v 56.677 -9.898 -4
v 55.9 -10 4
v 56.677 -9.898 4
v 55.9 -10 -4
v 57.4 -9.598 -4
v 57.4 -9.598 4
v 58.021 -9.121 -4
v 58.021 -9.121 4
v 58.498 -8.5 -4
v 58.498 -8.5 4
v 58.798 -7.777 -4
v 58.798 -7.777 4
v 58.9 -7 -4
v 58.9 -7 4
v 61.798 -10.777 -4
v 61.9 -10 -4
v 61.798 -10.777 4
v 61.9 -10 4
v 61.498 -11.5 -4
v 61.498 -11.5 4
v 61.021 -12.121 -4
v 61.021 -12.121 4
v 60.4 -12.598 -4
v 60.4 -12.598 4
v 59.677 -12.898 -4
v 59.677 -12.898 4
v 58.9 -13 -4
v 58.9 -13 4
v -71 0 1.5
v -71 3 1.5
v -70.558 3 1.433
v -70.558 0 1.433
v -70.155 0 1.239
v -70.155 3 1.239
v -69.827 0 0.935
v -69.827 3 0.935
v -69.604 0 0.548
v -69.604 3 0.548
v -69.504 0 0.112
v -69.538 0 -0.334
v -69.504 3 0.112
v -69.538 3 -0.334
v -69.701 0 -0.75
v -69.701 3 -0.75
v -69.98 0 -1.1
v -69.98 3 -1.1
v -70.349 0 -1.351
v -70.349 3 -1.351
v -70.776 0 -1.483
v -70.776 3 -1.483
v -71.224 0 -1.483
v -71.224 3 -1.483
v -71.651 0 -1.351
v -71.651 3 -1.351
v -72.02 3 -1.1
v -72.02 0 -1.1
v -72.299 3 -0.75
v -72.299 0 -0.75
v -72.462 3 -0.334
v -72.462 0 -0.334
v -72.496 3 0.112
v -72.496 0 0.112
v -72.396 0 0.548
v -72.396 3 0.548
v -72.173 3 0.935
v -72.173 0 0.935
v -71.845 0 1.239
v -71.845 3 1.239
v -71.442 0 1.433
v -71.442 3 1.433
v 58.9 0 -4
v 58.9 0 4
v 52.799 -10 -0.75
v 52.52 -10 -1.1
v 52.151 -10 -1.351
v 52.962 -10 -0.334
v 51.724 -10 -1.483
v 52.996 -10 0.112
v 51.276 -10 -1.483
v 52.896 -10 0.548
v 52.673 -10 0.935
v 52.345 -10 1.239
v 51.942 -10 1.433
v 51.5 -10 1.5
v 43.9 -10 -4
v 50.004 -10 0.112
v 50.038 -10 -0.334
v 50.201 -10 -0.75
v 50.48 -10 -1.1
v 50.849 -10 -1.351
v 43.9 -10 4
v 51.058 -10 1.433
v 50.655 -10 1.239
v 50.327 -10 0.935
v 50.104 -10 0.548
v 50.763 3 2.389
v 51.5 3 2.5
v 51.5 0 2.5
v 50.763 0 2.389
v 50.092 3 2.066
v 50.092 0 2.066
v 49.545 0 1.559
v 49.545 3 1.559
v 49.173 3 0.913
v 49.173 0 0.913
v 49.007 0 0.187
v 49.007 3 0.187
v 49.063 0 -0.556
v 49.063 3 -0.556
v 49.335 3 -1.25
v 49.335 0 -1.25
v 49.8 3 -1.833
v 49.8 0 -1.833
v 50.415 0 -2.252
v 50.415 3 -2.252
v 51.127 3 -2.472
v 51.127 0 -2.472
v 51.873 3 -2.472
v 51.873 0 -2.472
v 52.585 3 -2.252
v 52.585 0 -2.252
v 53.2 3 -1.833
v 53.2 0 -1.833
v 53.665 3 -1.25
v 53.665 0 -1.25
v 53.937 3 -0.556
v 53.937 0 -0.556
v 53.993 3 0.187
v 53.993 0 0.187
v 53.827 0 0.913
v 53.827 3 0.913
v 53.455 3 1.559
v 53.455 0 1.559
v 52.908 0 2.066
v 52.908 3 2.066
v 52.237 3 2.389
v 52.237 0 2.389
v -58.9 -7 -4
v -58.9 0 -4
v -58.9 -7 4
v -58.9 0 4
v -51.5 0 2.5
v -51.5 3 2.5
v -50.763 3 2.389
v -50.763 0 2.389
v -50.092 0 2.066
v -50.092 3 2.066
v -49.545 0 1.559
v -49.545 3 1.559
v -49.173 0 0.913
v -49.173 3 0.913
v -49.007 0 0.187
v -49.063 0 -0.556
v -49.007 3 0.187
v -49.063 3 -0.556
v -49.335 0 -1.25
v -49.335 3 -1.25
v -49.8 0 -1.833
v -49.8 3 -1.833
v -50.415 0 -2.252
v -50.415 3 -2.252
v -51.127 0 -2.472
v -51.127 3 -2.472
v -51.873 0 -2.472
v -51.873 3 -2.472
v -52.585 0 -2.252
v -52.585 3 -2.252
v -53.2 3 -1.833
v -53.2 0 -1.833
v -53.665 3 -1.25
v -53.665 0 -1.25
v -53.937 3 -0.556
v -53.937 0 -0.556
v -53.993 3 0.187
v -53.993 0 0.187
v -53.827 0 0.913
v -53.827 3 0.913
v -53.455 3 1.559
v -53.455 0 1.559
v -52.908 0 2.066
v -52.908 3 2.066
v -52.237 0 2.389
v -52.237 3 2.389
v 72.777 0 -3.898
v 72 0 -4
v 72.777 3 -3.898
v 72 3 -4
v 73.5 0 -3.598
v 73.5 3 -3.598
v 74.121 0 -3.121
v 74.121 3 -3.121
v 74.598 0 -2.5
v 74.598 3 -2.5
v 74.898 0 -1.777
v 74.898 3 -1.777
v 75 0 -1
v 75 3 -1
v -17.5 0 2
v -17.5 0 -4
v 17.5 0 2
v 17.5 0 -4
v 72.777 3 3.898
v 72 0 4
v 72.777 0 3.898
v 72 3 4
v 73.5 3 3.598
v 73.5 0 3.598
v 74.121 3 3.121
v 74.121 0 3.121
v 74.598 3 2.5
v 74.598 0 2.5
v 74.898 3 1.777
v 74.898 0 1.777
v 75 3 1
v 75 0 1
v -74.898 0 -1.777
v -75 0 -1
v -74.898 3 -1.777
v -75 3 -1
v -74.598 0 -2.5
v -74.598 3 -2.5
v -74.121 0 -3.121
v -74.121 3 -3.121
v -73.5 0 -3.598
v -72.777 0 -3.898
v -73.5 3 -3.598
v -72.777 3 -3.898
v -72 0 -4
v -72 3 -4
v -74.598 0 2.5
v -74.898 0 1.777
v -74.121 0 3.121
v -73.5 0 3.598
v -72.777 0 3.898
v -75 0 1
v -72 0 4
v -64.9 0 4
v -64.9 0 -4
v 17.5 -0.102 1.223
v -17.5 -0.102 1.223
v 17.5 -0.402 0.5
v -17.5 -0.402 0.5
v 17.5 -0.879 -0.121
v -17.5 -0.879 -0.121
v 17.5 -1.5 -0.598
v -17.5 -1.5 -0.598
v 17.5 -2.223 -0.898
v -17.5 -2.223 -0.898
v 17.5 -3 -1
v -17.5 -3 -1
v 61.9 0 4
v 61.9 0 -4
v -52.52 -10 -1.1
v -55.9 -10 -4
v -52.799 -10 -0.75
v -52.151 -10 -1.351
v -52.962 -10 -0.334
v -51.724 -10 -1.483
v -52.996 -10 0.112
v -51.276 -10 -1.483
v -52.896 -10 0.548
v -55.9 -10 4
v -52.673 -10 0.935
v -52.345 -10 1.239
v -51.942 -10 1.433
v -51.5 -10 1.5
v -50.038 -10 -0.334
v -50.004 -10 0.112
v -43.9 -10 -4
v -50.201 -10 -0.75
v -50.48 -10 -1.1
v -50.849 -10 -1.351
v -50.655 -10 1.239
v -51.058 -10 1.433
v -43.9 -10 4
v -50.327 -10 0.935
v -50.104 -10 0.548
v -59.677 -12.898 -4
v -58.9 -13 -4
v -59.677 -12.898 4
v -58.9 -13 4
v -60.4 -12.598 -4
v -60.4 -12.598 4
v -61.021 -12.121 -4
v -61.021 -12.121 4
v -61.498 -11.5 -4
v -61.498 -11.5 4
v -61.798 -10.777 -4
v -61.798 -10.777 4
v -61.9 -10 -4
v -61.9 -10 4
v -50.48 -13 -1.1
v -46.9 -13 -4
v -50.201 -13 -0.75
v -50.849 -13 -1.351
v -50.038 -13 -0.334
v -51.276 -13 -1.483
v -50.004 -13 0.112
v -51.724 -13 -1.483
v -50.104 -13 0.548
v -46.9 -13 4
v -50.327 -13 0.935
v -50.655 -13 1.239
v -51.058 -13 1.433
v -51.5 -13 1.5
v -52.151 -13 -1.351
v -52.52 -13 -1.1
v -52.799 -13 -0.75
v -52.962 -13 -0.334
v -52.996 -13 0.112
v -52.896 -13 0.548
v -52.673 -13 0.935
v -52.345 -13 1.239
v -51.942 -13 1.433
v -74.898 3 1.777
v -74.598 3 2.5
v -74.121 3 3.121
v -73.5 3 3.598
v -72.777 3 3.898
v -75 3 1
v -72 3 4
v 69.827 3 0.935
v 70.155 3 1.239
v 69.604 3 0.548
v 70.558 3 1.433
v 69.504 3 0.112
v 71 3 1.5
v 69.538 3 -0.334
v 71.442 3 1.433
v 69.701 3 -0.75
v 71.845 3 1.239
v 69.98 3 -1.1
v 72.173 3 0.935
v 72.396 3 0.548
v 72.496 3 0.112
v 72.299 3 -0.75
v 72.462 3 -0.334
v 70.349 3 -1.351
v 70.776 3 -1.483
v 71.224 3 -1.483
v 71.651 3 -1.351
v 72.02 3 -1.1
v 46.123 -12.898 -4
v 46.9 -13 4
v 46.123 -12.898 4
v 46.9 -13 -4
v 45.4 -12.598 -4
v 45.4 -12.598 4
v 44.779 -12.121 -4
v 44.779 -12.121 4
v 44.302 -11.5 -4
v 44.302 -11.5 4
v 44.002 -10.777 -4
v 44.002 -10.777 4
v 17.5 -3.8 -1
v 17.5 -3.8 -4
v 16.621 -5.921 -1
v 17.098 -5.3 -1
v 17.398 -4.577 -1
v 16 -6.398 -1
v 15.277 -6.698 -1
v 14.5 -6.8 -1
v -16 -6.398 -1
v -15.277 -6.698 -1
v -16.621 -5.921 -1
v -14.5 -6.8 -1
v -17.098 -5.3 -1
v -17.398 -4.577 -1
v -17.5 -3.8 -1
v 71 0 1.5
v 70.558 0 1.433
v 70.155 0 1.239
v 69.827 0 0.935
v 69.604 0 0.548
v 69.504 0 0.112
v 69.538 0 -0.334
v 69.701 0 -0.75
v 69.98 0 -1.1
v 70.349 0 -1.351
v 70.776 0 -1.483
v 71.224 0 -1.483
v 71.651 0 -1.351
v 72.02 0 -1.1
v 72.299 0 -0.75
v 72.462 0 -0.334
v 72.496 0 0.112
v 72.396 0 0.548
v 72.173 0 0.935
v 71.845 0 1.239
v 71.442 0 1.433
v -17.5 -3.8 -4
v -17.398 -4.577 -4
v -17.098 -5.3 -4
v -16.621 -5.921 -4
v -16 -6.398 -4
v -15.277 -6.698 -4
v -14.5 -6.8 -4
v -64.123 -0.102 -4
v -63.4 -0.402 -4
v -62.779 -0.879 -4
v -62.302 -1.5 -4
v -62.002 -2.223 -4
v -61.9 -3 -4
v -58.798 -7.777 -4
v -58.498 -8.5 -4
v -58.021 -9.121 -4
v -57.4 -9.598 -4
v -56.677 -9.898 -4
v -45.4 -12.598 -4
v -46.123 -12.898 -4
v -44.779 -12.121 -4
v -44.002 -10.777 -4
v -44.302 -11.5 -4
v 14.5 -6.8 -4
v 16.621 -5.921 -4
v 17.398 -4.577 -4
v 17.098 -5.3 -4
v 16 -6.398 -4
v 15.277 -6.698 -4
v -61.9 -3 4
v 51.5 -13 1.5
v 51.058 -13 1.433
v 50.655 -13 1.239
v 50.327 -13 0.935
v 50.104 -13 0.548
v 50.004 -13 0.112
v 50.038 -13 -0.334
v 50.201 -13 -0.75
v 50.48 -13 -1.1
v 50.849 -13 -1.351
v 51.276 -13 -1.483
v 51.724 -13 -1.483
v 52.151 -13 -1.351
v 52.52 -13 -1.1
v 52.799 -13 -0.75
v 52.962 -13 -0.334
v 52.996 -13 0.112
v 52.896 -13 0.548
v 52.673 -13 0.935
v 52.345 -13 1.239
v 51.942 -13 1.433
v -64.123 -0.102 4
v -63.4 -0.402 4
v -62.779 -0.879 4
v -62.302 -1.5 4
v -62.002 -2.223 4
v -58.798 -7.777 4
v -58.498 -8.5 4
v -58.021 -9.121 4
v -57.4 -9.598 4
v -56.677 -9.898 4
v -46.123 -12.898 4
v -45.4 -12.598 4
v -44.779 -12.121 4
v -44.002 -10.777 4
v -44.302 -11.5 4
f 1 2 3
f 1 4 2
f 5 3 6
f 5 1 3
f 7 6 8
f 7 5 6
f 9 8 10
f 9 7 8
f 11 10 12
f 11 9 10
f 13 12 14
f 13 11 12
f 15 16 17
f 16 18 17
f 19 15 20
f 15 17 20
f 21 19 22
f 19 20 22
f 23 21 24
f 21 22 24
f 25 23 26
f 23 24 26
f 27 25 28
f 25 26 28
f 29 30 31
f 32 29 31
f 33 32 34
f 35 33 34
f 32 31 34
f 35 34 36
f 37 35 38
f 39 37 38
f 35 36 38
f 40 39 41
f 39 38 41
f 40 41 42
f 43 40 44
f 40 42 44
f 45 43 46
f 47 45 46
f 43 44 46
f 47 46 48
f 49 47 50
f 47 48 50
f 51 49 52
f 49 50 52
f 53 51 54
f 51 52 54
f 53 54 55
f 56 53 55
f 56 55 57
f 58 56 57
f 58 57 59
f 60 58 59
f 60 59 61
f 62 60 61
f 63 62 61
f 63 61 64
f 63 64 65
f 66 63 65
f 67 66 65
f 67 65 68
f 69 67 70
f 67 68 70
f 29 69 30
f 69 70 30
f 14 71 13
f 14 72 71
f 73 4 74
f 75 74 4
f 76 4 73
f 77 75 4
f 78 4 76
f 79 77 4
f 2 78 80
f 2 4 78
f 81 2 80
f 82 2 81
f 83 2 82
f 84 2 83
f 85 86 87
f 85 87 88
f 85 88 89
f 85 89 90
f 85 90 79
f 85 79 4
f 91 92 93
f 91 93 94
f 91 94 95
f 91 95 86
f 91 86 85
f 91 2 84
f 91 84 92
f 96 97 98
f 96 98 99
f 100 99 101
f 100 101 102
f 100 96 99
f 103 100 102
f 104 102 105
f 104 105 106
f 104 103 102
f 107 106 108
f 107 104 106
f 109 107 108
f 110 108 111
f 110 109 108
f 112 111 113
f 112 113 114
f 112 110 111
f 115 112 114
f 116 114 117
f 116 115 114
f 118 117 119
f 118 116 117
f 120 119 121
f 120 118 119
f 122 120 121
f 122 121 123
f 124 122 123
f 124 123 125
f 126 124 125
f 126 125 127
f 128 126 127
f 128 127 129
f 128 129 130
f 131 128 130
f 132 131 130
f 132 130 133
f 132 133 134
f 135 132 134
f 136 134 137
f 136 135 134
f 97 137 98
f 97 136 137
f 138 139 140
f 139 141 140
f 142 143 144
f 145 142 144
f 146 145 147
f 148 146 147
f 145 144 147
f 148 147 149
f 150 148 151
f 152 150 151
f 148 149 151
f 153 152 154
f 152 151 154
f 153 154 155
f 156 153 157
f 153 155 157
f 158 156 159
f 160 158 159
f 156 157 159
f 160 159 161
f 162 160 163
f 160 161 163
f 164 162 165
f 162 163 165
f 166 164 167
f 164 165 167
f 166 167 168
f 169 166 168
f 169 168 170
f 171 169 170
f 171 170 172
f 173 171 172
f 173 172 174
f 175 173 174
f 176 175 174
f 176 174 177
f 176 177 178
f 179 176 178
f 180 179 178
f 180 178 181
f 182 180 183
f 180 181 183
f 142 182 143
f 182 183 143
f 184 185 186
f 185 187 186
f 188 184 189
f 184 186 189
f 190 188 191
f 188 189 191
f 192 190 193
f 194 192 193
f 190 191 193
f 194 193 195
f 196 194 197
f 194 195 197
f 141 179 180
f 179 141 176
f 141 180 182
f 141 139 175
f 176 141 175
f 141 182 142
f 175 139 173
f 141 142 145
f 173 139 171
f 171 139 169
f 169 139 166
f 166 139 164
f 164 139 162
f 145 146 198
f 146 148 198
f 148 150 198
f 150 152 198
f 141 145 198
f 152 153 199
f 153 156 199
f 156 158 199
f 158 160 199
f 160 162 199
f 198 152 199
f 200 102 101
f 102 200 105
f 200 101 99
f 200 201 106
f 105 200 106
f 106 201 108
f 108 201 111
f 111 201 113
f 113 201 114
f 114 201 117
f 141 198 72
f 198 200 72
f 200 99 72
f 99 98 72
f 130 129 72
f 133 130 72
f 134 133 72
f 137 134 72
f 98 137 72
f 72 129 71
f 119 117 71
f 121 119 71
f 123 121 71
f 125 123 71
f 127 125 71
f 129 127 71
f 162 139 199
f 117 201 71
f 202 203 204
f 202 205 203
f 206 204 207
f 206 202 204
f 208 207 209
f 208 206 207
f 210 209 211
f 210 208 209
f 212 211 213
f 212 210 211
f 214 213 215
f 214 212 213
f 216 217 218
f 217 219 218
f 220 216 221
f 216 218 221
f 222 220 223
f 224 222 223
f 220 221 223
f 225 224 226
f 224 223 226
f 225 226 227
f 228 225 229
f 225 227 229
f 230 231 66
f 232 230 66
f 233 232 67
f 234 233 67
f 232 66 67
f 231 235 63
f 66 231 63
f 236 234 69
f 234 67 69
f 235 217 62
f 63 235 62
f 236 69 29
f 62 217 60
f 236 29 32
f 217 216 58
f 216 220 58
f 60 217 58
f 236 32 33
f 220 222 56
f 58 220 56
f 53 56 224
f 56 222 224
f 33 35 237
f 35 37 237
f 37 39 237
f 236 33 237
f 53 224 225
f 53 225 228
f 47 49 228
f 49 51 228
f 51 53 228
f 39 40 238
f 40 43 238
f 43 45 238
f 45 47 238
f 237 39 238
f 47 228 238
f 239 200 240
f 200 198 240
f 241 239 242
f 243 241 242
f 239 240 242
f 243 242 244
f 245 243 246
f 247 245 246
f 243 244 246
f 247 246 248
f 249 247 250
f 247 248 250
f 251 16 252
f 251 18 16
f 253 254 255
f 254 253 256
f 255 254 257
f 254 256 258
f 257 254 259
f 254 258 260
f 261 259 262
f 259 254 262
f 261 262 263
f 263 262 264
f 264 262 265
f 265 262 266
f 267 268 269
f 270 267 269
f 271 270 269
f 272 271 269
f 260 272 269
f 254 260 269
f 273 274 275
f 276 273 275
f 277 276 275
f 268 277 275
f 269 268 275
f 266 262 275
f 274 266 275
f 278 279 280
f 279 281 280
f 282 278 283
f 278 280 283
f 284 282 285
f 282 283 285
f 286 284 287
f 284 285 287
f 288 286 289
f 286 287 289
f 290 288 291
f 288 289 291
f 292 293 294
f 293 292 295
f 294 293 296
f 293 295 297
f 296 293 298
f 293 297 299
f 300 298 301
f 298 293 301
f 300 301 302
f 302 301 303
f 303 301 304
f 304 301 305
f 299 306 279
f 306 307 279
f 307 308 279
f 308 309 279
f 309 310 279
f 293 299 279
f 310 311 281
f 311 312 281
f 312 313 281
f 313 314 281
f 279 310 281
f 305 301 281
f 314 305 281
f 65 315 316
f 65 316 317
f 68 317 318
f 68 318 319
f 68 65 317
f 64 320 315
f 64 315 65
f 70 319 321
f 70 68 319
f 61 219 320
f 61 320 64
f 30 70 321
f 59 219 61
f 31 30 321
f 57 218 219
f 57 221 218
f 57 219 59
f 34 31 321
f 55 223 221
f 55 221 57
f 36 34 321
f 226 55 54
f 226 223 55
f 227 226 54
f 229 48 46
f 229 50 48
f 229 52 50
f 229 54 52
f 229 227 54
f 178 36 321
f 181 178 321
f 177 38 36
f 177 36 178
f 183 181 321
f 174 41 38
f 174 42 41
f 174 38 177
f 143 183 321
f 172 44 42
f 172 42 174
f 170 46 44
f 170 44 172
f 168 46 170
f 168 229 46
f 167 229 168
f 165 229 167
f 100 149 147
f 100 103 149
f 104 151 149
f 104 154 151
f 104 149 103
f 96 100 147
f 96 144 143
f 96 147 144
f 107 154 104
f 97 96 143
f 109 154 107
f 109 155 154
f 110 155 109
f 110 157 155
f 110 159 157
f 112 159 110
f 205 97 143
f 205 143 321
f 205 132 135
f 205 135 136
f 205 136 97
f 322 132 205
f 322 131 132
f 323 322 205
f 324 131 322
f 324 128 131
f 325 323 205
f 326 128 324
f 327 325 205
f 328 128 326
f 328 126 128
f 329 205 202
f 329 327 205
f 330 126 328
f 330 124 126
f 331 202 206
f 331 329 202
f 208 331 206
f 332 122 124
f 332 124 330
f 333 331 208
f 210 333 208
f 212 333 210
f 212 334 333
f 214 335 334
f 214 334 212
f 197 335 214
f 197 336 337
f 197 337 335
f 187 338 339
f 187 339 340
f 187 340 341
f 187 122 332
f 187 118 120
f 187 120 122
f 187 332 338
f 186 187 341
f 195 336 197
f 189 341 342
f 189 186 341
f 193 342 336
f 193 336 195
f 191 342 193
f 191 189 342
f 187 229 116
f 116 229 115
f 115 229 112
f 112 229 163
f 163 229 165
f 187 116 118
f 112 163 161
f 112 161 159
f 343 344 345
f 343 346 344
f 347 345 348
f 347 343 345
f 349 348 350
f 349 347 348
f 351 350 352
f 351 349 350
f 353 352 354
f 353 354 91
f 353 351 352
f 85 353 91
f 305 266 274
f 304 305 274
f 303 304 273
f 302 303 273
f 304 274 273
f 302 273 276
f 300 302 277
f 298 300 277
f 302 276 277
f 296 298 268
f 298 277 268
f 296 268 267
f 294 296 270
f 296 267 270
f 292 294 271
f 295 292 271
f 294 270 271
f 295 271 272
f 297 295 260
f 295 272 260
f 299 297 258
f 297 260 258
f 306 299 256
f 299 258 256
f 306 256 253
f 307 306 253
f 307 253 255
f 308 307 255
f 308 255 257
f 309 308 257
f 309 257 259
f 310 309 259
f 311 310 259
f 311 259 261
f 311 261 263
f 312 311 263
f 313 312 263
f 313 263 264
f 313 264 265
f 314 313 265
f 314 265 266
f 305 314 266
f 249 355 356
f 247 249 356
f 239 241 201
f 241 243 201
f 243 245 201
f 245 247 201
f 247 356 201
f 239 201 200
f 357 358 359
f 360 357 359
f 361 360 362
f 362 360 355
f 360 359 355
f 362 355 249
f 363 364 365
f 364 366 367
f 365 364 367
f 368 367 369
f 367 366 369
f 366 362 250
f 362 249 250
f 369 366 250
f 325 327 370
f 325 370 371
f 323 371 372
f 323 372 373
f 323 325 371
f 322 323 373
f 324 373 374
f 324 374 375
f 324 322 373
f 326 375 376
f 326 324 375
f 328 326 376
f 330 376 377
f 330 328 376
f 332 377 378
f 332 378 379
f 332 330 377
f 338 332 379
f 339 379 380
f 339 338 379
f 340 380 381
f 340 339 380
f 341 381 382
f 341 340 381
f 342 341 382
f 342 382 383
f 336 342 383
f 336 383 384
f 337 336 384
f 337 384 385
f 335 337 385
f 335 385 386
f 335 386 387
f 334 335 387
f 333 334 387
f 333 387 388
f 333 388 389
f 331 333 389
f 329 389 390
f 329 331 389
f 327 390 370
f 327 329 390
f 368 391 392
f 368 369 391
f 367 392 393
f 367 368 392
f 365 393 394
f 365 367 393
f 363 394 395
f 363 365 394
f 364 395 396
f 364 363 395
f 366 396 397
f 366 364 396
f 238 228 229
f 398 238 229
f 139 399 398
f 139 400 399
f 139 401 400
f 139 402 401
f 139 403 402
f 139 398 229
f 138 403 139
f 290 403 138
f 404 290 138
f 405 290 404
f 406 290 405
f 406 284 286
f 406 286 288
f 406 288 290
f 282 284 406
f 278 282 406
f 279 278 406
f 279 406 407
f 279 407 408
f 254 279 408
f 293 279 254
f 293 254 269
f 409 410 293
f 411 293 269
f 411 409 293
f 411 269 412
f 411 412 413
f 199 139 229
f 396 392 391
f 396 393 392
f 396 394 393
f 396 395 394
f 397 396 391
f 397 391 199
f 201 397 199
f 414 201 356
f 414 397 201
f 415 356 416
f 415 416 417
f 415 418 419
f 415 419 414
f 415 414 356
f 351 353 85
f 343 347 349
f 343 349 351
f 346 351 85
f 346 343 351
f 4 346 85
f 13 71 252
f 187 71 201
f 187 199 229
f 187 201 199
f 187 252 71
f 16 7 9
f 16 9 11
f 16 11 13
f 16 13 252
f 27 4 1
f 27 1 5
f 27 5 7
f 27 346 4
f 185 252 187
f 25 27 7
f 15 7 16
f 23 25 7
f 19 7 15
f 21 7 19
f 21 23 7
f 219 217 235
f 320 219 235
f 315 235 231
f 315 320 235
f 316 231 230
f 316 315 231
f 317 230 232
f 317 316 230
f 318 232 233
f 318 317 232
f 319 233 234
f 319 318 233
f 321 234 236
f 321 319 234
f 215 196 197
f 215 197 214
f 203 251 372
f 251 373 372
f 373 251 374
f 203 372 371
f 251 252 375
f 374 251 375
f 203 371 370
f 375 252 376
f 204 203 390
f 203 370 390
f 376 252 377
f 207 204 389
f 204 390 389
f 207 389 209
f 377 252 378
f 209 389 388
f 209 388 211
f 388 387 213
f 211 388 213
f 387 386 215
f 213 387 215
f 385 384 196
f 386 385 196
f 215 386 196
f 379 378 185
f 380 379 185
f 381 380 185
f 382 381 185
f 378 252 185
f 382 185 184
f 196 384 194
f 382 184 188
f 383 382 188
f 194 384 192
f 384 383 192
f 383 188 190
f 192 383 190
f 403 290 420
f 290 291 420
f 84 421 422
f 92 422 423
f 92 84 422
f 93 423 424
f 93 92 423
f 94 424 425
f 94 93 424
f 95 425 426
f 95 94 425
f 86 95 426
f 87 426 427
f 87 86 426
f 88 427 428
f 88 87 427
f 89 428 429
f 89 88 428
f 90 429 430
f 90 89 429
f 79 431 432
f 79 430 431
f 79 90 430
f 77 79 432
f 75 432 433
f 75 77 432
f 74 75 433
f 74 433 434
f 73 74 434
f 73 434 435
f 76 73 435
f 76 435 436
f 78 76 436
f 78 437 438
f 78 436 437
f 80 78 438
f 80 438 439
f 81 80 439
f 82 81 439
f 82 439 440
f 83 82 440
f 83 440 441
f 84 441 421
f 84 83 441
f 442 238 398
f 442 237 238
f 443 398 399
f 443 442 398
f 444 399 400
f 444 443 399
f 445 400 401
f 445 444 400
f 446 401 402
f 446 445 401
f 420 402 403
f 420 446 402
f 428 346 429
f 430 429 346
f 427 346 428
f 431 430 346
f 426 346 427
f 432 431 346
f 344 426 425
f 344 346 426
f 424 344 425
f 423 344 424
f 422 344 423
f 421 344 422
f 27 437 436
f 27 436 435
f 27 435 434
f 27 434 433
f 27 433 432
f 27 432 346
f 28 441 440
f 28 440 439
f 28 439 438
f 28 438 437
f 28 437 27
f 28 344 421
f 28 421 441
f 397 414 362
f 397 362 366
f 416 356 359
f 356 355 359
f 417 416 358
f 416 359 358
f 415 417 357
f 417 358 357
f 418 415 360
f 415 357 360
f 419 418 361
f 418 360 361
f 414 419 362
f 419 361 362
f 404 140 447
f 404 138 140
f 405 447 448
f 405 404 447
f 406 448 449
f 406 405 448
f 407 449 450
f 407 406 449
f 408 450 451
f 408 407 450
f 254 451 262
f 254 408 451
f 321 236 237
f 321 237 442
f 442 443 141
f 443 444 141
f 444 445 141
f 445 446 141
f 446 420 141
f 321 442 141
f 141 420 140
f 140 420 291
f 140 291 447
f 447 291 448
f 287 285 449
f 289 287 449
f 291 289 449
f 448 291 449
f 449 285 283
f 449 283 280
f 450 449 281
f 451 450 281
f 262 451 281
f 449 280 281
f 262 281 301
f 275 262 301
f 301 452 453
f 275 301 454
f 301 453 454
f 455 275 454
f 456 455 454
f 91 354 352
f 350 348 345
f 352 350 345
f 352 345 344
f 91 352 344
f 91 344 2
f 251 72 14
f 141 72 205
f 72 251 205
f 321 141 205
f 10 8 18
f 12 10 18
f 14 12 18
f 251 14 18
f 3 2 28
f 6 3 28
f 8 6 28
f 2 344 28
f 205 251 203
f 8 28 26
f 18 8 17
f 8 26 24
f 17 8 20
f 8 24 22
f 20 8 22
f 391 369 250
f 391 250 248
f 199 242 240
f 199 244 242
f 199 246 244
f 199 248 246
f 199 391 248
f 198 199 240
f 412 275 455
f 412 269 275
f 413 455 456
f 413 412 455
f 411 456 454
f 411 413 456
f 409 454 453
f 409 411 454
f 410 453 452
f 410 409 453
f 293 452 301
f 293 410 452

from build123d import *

# Parameters (mm, degrees)
BOSS_EXTRUDE1_DEPTH = 3
BOSS_EXTRUDE2_DEPTH = 4
SKETCH4_R           = 1.5
SKETCH4_R_2         = 2.5
CUT_EXTRUDE1_DEPTH  = 3
SKETCH5_R           = 1.5
CUT_EXTRUDE2_DEPTH  = 77.223356001
SKETCH6_W           = 35
SKETCH6_H           = 6.8
BOSS_EXTRUDE3_DEPTH = 3
FILLET1_R           = 3


with BuildPart() as part:
    # Sketch2 → Boss-Extrude1 (new body)
    with BuildSketch(Plane(origin=(0, 0, 0), x_dir=(1, 0, 0), z_dir=(0, 1, 0))):
        Polygon((-75, 4), (-75, -4), (75, -4), align=None)
        Polygon((75, 4), (75, -4), (-75, 4), align=None)
    extrude(amount=BOSS_EXTRUDE1_DEPTH)

    # Sketch3 → Boss-Extrude2 (add, symmetric)
    with BuildSketch(Plane.XY):
        Polygon((-58.9, 0), (-58.9, -10), (-43.9, -10), (-43.9, -13), (-61.9, -13), (-61.9, 0), align=None)
    boss_extrude2 = extrude(amount=BOSS_EXTRUDE2_DEPTH, both=True)

    # Sketch4 → Cut-Extrude1 (cut)
    with BuildSketch(Plane(origin=(0, 3, 0), x_dir=(1, 0, 0), z_dir=(0, 1, 0))):
        with Locations(Location((-71, 0, 0), (0, 0, 270))):
            Circle(SKETCH4_R)
        with Locations(Location((-51.5, 0, 0), (0, 0, 270))):
            Circle(SKETCH4_R_2)
    cut_extrude1 = extrude(amount=-CUT_EXTRUDE1_DEPTH, mode=Mode.SUBTRACT)

    # Sketch5 → Cut-Extrude2 (cut, through all)
    with BuildSketch(Plane(origin=(0, -10, 0), x_dir=(1, 0, 0), z_dir=(0, 1, 0))):
        with Locations(Location((-51.5, 0, 0), (0, 0, 270))):
            Circle(SKETCH5_R)
    cut_extrude2 = extrude(amount=-CUT_EXTRUDE2_DEPTH, mode=Mode.SUBTRACT)

    # Mirror1: Boss-Extrude2, Cut-Extrude1, Cut-Extrude2 across plane
    add(boss_extrude2.mirror(Plane(origin=(0, 0, 0), x_dir=(0, 0, 1), z_dir=(1, 0, 0))))
    add(cut_extrude1.mirror(Plane(origin=(0, 0, 0), x_dir=(0, 0, 1), z_dir=(1, 0, 0))), mode=Mode.SUBTRACT)
    add(cut_extrude2.mirror(Plane(origin=(0, 0, 0), x_dir=(0, 0, 1), z_dir=(1, 0, 0))), mode=Mode.SUBTRACT)

    # Sketch6 → Boss-Extrude3 (add)
    with BuildSketch(Plane(origin=(0, 0, -4), x_dir=(-1, 0, 0), z_dir=(0, 0, -1))):
        with Locations((0, -3.4)):
            Rectangle(SKETCH6_W, SKETCH6_H)
    extrude(amount=-BOSS_EXTRUDE3_DEPTH)

    # Fillet1
    fillet1_edges = [part.edges().sort_by_distance(p)[0] for p in [
        (-61.9, 0, 0),
        (-61.9, -13, 0),
        (-43.9, -13, 0),
        (-58.9, -10, 0),
        (58.9, -10, 0),
        (43.9, -13, 0),
        (61.9, -13, 0),
        (17.5, -6.8, -2.5),
        (0, 0, -1),
        (-17.5, -6.8, -2.5),
        (-75, 1.5, -4),
        (75, 1.5, -4),
        (75, 1.5, 4),
        (-75, 1.5, 4),
    ]]
    fillet(fillet1_edges, radius=FILLET1_R - 0.0001)  # a hair under: the kernel refuses the full size


solid = part.part
